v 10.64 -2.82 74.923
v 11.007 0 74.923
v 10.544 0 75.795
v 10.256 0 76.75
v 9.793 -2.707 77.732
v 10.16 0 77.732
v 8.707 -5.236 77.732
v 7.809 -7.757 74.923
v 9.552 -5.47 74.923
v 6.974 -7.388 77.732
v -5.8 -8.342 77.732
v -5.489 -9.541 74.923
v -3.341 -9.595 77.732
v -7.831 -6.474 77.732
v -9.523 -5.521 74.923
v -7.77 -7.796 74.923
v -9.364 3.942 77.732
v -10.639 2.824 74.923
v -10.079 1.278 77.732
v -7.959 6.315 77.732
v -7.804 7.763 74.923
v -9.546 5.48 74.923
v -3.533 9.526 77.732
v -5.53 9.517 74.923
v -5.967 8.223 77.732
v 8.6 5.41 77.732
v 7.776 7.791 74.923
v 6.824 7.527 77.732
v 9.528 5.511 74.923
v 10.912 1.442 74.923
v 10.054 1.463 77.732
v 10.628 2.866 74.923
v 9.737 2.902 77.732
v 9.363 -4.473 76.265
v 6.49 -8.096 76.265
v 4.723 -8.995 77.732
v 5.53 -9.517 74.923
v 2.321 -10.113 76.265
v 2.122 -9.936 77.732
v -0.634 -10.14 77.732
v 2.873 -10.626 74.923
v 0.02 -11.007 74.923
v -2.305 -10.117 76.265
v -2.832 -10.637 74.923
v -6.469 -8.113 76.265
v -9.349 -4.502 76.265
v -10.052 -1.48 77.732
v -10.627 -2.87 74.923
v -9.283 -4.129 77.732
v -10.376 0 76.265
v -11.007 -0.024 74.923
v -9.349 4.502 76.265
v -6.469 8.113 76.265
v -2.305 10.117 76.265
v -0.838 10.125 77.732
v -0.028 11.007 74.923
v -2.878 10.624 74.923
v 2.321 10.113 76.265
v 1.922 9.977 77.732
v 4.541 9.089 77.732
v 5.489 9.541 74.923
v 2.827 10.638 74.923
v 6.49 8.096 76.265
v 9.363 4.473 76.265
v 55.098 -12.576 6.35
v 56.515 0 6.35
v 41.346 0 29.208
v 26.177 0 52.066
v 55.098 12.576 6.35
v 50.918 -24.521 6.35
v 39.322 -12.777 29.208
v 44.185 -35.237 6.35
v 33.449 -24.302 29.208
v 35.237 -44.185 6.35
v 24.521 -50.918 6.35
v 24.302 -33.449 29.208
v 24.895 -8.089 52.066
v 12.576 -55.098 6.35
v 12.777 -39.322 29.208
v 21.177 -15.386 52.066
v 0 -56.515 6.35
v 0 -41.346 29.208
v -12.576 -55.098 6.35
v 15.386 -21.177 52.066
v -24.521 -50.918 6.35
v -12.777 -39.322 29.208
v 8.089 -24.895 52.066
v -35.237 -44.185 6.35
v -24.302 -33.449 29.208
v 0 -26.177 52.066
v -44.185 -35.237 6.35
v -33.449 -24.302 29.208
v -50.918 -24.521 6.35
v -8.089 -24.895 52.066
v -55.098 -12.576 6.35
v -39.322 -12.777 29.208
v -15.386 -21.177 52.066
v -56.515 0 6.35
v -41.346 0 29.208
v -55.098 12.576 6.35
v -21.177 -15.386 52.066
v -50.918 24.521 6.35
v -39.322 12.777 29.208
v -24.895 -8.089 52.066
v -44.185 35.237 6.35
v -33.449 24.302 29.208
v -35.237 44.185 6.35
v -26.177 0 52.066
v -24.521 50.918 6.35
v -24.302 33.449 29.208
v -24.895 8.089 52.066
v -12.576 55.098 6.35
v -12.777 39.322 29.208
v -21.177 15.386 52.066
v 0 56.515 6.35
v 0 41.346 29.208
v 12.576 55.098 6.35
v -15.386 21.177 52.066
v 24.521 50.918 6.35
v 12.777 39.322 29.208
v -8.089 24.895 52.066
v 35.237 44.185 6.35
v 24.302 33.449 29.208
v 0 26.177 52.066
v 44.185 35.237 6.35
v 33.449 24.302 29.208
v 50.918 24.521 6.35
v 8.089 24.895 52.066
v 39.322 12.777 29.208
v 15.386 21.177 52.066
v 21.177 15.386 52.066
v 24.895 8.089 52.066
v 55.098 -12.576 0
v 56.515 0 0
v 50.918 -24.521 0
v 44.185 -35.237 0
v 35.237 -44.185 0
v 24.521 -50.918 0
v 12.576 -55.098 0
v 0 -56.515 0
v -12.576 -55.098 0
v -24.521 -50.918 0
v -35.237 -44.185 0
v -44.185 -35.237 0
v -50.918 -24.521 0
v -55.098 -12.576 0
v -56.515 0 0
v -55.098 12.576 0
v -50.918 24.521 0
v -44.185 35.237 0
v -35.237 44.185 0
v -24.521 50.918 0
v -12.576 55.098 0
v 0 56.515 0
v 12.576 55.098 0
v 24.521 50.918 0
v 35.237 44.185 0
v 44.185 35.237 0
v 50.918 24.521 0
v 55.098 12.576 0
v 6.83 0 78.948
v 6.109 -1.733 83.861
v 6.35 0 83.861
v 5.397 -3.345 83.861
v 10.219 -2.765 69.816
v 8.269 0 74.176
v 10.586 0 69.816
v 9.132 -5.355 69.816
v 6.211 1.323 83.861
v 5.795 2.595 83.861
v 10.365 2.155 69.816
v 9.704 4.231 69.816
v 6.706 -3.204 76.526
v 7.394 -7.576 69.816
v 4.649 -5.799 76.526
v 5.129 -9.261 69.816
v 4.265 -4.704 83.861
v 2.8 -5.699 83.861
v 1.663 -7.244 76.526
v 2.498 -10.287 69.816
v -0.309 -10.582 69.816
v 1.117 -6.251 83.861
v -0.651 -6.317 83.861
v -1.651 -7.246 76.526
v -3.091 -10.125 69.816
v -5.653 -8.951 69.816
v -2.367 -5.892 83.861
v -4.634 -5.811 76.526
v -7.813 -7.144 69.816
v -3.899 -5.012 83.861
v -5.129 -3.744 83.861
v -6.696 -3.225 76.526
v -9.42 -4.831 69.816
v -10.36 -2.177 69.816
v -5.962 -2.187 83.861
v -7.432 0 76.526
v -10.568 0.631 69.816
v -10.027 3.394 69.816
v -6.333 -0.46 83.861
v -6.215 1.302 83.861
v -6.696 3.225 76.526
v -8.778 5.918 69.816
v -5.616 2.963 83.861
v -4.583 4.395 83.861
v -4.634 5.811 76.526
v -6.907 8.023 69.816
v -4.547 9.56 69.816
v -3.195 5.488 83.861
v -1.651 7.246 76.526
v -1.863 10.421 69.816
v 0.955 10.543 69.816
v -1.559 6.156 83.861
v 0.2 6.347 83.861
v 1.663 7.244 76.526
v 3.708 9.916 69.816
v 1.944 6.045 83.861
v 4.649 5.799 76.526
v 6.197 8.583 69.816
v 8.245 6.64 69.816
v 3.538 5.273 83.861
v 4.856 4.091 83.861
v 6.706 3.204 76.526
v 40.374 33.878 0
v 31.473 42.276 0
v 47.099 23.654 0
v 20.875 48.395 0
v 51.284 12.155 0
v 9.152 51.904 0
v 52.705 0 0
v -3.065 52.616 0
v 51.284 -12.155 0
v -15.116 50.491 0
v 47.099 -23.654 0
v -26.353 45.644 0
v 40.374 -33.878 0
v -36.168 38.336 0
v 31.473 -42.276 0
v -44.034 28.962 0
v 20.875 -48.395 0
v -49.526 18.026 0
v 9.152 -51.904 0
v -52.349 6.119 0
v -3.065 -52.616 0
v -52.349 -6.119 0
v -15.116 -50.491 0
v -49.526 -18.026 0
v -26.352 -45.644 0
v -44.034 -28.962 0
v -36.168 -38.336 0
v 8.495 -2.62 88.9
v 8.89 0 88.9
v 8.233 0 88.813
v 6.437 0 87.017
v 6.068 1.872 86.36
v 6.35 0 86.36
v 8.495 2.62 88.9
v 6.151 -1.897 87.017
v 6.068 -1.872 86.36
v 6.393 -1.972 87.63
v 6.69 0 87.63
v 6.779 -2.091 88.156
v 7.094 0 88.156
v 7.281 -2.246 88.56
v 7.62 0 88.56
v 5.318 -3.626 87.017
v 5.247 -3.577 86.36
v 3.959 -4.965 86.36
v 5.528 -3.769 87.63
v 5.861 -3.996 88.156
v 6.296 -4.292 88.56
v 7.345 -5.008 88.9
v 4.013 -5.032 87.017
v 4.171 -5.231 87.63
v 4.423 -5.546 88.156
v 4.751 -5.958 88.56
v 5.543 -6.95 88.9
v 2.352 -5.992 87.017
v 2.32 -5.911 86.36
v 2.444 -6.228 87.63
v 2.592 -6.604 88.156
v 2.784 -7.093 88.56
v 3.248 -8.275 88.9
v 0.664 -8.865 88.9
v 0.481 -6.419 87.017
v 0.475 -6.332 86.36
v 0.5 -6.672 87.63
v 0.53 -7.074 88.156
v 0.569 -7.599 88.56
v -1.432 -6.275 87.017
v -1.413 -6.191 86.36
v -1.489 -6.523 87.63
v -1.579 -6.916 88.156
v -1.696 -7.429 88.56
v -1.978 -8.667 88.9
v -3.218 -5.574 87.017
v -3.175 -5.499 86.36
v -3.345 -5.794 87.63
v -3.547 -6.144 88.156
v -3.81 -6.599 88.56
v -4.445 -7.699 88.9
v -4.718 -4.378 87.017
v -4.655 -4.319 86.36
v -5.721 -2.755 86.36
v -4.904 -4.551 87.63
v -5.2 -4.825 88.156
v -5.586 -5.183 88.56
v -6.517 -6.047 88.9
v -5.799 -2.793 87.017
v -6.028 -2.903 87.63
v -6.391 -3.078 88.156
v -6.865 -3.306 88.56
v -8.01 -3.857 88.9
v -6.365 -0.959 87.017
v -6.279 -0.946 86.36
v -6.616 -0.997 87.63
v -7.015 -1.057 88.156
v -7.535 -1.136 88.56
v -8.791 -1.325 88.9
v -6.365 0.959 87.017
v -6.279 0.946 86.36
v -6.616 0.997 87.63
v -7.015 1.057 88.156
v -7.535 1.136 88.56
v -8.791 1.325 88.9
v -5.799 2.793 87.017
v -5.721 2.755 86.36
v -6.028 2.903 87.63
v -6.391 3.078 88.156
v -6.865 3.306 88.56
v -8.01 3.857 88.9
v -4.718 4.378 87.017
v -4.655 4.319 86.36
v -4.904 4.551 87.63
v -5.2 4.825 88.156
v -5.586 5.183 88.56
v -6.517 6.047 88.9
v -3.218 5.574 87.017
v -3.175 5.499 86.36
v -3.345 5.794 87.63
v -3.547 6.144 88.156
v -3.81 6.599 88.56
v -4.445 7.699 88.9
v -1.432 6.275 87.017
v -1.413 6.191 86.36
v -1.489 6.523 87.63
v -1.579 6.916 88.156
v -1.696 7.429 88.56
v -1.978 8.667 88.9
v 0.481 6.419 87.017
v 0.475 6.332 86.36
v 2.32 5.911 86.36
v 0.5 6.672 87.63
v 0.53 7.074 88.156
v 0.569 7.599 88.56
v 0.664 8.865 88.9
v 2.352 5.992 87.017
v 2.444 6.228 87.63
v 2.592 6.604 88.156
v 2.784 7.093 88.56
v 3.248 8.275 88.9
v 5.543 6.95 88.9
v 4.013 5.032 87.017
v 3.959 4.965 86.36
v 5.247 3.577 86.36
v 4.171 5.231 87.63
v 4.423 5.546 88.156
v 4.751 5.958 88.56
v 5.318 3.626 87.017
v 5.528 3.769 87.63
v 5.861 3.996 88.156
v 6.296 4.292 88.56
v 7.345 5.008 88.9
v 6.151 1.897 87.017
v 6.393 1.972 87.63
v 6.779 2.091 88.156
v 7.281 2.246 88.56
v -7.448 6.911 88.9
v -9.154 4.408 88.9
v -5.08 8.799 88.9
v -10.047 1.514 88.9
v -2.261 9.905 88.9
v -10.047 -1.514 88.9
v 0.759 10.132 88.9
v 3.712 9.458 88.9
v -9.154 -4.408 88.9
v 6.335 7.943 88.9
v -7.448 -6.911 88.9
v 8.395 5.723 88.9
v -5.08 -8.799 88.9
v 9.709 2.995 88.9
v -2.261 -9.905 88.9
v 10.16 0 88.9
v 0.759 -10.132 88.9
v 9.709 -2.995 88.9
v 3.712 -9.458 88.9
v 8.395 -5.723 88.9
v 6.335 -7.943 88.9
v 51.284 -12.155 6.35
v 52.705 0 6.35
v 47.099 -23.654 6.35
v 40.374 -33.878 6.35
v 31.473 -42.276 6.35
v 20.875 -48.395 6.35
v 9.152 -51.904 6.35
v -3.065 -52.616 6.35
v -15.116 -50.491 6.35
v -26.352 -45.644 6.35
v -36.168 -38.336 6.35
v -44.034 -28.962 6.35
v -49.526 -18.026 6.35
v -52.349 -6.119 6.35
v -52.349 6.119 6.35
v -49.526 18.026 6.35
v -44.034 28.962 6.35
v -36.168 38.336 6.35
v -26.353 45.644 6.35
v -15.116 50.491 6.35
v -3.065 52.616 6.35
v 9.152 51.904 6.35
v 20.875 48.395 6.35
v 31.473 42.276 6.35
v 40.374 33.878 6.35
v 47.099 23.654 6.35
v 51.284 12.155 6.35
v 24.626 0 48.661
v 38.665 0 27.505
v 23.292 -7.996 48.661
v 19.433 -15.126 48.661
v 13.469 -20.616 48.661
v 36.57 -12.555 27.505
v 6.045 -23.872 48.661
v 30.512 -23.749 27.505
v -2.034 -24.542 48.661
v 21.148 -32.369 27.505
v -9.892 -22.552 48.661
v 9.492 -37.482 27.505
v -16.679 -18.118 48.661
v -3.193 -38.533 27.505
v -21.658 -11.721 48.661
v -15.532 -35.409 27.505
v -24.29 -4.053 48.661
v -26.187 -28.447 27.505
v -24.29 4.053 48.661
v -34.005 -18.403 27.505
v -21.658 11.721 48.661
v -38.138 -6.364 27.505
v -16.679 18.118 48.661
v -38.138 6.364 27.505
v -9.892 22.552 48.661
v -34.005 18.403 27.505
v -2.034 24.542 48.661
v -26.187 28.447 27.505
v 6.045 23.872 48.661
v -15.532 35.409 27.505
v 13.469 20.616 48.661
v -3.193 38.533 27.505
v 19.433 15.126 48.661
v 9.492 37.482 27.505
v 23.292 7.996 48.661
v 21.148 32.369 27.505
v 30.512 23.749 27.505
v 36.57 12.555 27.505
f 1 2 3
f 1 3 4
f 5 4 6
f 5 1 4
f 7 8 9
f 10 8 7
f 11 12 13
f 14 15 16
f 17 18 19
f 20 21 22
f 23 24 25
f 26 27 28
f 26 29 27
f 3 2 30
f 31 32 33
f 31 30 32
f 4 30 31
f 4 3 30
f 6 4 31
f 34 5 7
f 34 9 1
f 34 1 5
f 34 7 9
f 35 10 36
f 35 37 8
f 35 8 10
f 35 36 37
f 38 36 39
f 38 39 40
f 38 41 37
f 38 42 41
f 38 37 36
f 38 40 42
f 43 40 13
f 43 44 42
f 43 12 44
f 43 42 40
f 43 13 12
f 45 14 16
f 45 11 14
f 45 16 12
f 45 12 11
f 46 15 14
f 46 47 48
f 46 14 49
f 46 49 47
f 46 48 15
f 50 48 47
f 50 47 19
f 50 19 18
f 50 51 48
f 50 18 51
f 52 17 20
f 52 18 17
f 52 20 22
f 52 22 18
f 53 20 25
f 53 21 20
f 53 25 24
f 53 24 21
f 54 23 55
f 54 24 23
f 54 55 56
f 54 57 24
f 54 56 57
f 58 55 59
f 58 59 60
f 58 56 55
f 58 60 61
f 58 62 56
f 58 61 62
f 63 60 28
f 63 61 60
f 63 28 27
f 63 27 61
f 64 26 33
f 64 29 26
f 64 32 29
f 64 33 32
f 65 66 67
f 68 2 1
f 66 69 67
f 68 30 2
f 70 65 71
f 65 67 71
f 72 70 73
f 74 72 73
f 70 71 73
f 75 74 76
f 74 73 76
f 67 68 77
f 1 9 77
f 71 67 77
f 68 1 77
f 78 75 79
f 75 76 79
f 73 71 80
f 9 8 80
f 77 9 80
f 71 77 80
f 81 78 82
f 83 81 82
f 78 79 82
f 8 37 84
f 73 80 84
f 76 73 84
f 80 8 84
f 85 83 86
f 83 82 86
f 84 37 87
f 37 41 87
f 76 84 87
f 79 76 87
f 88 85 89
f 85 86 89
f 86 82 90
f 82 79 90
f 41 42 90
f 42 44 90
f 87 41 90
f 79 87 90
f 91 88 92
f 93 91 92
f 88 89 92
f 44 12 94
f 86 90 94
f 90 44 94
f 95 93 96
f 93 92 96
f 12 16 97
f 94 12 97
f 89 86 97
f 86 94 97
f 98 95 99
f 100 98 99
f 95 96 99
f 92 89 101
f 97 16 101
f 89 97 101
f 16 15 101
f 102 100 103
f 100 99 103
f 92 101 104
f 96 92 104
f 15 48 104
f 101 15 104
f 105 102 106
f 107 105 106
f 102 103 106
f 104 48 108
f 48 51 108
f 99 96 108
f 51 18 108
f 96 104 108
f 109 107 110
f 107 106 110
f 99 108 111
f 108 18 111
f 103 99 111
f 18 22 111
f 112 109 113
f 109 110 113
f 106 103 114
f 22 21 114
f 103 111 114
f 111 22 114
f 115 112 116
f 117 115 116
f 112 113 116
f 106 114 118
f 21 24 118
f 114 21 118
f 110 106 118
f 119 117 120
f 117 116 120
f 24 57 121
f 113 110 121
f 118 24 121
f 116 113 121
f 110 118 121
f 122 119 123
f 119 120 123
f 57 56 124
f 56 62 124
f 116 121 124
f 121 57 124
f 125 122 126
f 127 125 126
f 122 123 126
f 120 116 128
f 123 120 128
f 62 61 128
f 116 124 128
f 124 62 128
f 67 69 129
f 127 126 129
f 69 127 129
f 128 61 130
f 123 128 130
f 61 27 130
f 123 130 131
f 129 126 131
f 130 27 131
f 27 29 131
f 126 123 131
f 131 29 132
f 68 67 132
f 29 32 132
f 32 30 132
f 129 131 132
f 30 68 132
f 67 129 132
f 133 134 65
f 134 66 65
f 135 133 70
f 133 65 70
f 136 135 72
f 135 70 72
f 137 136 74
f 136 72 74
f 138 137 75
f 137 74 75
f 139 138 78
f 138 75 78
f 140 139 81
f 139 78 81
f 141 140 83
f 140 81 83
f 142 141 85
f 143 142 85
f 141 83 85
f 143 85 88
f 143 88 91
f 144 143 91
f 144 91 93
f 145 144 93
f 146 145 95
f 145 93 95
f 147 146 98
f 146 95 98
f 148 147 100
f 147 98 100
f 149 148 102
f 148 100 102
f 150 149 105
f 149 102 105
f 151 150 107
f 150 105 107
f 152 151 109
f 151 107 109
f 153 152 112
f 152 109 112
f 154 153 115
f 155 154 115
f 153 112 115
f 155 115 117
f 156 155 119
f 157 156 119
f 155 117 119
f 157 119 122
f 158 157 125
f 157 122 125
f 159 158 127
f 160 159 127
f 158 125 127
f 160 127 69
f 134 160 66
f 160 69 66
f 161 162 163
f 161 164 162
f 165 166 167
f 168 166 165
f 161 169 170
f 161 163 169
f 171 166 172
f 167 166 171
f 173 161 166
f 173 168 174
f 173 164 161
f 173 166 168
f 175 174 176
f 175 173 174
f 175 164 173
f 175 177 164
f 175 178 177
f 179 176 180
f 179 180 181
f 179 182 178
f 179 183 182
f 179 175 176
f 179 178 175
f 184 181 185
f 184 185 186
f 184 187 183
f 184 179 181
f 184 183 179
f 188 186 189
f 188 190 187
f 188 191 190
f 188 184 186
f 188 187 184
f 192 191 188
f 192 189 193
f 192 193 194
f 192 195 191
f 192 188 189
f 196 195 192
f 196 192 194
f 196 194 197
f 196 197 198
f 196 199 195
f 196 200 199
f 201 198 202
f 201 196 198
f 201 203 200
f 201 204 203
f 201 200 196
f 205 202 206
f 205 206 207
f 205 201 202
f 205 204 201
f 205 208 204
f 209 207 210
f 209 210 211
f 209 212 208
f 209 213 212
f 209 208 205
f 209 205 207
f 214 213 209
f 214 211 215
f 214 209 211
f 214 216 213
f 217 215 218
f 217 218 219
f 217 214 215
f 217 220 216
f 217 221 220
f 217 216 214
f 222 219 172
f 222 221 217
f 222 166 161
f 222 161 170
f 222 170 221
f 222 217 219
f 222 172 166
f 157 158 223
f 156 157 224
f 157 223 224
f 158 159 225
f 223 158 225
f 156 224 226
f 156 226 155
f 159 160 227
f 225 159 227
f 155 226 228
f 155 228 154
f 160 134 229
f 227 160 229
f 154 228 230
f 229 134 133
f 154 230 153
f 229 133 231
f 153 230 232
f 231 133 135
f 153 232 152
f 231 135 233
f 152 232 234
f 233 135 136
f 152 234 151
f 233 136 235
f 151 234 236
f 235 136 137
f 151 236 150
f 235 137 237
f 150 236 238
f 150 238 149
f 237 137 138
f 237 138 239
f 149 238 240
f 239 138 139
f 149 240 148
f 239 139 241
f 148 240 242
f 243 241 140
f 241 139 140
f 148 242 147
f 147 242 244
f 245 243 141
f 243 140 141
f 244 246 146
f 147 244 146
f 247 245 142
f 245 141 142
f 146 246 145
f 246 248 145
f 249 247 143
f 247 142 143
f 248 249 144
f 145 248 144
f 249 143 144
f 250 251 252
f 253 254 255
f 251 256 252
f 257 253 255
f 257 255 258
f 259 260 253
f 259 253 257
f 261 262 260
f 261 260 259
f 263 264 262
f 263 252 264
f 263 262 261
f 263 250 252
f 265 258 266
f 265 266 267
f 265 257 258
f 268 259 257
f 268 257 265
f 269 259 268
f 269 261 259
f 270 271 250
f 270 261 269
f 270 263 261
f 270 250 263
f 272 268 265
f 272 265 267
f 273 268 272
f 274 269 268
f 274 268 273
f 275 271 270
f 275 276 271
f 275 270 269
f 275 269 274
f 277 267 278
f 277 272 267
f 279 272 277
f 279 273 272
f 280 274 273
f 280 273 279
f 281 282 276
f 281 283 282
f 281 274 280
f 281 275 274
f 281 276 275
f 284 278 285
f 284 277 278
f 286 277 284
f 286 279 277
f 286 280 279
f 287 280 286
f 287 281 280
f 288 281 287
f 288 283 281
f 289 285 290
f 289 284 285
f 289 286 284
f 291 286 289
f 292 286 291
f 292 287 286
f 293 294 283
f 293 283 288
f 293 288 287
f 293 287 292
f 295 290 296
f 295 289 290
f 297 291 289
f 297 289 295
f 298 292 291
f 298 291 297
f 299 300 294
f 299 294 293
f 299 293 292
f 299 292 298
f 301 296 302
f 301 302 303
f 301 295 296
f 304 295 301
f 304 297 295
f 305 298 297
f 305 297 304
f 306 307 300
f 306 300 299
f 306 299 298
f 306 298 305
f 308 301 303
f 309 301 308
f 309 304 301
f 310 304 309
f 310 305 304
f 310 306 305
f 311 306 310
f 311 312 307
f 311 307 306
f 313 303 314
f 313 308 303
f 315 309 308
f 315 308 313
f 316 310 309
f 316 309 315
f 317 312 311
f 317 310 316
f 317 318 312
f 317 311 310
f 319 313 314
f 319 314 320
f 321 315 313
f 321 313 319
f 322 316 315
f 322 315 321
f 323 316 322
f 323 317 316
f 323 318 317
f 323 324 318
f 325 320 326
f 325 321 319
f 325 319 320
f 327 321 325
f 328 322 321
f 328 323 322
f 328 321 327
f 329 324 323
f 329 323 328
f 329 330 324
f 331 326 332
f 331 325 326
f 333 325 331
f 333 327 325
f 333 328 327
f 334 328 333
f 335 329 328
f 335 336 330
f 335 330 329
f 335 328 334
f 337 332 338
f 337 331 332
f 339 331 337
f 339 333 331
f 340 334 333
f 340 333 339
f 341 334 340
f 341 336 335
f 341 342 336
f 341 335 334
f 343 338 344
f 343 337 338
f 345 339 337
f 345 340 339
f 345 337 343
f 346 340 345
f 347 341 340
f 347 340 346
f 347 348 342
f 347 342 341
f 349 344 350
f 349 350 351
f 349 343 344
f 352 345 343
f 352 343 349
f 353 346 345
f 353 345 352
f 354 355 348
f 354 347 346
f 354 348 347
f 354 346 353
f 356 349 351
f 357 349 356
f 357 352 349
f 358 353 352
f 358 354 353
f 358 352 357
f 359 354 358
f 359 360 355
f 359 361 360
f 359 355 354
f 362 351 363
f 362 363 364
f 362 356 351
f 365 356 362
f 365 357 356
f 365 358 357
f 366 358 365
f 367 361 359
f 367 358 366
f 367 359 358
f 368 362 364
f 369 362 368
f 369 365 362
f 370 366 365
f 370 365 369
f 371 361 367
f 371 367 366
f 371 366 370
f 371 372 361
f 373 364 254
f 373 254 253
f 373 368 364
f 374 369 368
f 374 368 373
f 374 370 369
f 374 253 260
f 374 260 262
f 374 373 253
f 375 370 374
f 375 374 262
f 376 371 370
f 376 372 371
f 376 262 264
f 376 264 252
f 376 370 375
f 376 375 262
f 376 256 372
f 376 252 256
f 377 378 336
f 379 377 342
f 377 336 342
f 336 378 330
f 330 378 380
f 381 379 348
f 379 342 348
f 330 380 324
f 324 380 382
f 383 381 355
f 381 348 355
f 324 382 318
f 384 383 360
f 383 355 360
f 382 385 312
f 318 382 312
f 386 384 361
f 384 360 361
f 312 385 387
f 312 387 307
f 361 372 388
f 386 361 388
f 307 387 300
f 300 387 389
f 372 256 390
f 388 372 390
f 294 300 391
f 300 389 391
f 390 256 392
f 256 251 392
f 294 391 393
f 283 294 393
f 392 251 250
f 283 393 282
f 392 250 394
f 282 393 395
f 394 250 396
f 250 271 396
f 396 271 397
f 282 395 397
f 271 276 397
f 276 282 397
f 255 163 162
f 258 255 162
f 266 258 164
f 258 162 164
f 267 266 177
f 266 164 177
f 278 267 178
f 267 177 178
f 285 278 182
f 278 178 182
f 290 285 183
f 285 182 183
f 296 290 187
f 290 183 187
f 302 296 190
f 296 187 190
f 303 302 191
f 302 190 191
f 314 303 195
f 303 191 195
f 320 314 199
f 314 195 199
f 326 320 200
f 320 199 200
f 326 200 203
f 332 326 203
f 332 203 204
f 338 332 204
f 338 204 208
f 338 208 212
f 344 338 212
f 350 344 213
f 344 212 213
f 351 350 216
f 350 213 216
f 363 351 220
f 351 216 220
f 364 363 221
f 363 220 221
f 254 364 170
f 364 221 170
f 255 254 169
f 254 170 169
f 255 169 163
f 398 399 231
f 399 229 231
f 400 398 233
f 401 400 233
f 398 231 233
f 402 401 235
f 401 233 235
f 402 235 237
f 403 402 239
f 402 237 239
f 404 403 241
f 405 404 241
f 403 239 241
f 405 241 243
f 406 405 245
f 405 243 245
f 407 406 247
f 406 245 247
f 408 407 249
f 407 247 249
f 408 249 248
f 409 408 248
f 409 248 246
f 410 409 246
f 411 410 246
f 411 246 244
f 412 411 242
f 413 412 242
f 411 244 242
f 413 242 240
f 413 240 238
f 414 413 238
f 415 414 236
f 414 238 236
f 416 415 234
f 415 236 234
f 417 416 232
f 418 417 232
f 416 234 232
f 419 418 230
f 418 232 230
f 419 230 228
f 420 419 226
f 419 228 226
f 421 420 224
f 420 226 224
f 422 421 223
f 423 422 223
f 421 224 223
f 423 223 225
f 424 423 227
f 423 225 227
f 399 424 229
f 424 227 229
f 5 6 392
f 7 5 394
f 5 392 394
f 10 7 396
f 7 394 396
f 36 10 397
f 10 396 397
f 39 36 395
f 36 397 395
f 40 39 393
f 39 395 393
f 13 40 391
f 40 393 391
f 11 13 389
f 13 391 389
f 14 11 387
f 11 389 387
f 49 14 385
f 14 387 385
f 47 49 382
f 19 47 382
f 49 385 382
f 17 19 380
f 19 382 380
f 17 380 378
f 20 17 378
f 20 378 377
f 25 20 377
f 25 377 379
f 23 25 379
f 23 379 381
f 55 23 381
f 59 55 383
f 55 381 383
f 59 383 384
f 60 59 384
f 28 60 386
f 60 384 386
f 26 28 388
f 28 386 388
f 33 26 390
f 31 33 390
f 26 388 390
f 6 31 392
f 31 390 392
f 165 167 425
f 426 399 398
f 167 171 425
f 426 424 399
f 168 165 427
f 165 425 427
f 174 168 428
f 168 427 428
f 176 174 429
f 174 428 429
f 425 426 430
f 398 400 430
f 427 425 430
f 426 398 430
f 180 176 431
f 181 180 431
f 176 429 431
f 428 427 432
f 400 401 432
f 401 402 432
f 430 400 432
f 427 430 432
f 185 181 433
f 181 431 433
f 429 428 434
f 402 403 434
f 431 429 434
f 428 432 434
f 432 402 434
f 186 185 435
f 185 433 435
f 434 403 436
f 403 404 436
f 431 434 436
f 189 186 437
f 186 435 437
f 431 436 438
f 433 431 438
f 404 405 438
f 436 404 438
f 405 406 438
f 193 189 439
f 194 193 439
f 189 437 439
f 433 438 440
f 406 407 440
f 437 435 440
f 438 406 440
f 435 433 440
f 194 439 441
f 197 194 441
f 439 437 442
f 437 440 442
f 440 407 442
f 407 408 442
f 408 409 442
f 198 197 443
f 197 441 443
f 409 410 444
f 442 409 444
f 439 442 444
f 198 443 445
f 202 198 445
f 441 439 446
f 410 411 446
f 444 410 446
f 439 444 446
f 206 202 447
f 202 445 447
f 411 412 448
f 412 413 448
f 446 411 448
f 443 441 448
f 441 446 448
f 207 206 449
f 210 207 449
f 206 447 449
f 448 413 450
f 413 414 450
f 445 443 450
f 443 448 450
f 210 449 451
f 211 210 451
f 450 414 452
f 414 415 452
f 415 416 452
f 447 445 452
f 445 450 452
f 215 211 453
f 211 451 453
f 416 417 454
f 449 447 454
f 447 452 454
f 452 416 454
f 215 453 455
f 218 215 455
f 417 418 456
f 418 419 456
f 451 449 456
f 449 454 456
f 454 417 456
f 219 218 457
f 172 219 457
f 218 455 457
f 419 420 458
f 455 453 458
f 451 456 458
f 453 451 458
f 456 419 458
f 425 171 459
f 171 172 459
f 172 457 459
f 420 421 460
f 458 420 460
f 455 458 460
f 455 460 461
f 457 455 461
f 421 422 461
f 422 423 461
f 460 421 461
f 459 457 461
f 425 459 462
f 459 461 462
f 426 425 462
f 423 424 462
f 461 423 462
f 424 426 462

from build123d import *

# Parameters (mm, degrees)
F3_R = 5.08
F4_R = 25.4
F5_R = 2.54


with BuildPart() as f2:
    # F0 (on Front) → F2 (revolve)
    with BuildSketch(Plane.XZ):
        Polygon((52.705, 6.35), (52.705, 0), (56.515, 0), (56.515, 6.35), (10.16, 76.2), (10.16, 88.9), (6.35, 88.9), (6.35, 76.2), align=None)
    revolve(axis=Axis((0, 0, 41.439734), (0, 0, -1)))

    # F3
    f3_edges = [f2.edges().sort_by_distance(p)[0] for p in [
        (-10.16, 0, 76.2),
    ]]
    fillet(f3_edges, radius=F3_R)

    # F4
    f4_edges = [f2.edges().sort_by_distance(p)[0] for p in [
        (-6.35, 0, 76.2),
    ]]
    fillet(f4_edges, radius=F4_R)

    # F5
    f5_edges = [f2.edges().sort_by_distance(p)[0] for p in [
        (-6.35, 0, 88.9),
    ]]
    fillet(f5_edges, radius=F5_R)


solid = f2.part
